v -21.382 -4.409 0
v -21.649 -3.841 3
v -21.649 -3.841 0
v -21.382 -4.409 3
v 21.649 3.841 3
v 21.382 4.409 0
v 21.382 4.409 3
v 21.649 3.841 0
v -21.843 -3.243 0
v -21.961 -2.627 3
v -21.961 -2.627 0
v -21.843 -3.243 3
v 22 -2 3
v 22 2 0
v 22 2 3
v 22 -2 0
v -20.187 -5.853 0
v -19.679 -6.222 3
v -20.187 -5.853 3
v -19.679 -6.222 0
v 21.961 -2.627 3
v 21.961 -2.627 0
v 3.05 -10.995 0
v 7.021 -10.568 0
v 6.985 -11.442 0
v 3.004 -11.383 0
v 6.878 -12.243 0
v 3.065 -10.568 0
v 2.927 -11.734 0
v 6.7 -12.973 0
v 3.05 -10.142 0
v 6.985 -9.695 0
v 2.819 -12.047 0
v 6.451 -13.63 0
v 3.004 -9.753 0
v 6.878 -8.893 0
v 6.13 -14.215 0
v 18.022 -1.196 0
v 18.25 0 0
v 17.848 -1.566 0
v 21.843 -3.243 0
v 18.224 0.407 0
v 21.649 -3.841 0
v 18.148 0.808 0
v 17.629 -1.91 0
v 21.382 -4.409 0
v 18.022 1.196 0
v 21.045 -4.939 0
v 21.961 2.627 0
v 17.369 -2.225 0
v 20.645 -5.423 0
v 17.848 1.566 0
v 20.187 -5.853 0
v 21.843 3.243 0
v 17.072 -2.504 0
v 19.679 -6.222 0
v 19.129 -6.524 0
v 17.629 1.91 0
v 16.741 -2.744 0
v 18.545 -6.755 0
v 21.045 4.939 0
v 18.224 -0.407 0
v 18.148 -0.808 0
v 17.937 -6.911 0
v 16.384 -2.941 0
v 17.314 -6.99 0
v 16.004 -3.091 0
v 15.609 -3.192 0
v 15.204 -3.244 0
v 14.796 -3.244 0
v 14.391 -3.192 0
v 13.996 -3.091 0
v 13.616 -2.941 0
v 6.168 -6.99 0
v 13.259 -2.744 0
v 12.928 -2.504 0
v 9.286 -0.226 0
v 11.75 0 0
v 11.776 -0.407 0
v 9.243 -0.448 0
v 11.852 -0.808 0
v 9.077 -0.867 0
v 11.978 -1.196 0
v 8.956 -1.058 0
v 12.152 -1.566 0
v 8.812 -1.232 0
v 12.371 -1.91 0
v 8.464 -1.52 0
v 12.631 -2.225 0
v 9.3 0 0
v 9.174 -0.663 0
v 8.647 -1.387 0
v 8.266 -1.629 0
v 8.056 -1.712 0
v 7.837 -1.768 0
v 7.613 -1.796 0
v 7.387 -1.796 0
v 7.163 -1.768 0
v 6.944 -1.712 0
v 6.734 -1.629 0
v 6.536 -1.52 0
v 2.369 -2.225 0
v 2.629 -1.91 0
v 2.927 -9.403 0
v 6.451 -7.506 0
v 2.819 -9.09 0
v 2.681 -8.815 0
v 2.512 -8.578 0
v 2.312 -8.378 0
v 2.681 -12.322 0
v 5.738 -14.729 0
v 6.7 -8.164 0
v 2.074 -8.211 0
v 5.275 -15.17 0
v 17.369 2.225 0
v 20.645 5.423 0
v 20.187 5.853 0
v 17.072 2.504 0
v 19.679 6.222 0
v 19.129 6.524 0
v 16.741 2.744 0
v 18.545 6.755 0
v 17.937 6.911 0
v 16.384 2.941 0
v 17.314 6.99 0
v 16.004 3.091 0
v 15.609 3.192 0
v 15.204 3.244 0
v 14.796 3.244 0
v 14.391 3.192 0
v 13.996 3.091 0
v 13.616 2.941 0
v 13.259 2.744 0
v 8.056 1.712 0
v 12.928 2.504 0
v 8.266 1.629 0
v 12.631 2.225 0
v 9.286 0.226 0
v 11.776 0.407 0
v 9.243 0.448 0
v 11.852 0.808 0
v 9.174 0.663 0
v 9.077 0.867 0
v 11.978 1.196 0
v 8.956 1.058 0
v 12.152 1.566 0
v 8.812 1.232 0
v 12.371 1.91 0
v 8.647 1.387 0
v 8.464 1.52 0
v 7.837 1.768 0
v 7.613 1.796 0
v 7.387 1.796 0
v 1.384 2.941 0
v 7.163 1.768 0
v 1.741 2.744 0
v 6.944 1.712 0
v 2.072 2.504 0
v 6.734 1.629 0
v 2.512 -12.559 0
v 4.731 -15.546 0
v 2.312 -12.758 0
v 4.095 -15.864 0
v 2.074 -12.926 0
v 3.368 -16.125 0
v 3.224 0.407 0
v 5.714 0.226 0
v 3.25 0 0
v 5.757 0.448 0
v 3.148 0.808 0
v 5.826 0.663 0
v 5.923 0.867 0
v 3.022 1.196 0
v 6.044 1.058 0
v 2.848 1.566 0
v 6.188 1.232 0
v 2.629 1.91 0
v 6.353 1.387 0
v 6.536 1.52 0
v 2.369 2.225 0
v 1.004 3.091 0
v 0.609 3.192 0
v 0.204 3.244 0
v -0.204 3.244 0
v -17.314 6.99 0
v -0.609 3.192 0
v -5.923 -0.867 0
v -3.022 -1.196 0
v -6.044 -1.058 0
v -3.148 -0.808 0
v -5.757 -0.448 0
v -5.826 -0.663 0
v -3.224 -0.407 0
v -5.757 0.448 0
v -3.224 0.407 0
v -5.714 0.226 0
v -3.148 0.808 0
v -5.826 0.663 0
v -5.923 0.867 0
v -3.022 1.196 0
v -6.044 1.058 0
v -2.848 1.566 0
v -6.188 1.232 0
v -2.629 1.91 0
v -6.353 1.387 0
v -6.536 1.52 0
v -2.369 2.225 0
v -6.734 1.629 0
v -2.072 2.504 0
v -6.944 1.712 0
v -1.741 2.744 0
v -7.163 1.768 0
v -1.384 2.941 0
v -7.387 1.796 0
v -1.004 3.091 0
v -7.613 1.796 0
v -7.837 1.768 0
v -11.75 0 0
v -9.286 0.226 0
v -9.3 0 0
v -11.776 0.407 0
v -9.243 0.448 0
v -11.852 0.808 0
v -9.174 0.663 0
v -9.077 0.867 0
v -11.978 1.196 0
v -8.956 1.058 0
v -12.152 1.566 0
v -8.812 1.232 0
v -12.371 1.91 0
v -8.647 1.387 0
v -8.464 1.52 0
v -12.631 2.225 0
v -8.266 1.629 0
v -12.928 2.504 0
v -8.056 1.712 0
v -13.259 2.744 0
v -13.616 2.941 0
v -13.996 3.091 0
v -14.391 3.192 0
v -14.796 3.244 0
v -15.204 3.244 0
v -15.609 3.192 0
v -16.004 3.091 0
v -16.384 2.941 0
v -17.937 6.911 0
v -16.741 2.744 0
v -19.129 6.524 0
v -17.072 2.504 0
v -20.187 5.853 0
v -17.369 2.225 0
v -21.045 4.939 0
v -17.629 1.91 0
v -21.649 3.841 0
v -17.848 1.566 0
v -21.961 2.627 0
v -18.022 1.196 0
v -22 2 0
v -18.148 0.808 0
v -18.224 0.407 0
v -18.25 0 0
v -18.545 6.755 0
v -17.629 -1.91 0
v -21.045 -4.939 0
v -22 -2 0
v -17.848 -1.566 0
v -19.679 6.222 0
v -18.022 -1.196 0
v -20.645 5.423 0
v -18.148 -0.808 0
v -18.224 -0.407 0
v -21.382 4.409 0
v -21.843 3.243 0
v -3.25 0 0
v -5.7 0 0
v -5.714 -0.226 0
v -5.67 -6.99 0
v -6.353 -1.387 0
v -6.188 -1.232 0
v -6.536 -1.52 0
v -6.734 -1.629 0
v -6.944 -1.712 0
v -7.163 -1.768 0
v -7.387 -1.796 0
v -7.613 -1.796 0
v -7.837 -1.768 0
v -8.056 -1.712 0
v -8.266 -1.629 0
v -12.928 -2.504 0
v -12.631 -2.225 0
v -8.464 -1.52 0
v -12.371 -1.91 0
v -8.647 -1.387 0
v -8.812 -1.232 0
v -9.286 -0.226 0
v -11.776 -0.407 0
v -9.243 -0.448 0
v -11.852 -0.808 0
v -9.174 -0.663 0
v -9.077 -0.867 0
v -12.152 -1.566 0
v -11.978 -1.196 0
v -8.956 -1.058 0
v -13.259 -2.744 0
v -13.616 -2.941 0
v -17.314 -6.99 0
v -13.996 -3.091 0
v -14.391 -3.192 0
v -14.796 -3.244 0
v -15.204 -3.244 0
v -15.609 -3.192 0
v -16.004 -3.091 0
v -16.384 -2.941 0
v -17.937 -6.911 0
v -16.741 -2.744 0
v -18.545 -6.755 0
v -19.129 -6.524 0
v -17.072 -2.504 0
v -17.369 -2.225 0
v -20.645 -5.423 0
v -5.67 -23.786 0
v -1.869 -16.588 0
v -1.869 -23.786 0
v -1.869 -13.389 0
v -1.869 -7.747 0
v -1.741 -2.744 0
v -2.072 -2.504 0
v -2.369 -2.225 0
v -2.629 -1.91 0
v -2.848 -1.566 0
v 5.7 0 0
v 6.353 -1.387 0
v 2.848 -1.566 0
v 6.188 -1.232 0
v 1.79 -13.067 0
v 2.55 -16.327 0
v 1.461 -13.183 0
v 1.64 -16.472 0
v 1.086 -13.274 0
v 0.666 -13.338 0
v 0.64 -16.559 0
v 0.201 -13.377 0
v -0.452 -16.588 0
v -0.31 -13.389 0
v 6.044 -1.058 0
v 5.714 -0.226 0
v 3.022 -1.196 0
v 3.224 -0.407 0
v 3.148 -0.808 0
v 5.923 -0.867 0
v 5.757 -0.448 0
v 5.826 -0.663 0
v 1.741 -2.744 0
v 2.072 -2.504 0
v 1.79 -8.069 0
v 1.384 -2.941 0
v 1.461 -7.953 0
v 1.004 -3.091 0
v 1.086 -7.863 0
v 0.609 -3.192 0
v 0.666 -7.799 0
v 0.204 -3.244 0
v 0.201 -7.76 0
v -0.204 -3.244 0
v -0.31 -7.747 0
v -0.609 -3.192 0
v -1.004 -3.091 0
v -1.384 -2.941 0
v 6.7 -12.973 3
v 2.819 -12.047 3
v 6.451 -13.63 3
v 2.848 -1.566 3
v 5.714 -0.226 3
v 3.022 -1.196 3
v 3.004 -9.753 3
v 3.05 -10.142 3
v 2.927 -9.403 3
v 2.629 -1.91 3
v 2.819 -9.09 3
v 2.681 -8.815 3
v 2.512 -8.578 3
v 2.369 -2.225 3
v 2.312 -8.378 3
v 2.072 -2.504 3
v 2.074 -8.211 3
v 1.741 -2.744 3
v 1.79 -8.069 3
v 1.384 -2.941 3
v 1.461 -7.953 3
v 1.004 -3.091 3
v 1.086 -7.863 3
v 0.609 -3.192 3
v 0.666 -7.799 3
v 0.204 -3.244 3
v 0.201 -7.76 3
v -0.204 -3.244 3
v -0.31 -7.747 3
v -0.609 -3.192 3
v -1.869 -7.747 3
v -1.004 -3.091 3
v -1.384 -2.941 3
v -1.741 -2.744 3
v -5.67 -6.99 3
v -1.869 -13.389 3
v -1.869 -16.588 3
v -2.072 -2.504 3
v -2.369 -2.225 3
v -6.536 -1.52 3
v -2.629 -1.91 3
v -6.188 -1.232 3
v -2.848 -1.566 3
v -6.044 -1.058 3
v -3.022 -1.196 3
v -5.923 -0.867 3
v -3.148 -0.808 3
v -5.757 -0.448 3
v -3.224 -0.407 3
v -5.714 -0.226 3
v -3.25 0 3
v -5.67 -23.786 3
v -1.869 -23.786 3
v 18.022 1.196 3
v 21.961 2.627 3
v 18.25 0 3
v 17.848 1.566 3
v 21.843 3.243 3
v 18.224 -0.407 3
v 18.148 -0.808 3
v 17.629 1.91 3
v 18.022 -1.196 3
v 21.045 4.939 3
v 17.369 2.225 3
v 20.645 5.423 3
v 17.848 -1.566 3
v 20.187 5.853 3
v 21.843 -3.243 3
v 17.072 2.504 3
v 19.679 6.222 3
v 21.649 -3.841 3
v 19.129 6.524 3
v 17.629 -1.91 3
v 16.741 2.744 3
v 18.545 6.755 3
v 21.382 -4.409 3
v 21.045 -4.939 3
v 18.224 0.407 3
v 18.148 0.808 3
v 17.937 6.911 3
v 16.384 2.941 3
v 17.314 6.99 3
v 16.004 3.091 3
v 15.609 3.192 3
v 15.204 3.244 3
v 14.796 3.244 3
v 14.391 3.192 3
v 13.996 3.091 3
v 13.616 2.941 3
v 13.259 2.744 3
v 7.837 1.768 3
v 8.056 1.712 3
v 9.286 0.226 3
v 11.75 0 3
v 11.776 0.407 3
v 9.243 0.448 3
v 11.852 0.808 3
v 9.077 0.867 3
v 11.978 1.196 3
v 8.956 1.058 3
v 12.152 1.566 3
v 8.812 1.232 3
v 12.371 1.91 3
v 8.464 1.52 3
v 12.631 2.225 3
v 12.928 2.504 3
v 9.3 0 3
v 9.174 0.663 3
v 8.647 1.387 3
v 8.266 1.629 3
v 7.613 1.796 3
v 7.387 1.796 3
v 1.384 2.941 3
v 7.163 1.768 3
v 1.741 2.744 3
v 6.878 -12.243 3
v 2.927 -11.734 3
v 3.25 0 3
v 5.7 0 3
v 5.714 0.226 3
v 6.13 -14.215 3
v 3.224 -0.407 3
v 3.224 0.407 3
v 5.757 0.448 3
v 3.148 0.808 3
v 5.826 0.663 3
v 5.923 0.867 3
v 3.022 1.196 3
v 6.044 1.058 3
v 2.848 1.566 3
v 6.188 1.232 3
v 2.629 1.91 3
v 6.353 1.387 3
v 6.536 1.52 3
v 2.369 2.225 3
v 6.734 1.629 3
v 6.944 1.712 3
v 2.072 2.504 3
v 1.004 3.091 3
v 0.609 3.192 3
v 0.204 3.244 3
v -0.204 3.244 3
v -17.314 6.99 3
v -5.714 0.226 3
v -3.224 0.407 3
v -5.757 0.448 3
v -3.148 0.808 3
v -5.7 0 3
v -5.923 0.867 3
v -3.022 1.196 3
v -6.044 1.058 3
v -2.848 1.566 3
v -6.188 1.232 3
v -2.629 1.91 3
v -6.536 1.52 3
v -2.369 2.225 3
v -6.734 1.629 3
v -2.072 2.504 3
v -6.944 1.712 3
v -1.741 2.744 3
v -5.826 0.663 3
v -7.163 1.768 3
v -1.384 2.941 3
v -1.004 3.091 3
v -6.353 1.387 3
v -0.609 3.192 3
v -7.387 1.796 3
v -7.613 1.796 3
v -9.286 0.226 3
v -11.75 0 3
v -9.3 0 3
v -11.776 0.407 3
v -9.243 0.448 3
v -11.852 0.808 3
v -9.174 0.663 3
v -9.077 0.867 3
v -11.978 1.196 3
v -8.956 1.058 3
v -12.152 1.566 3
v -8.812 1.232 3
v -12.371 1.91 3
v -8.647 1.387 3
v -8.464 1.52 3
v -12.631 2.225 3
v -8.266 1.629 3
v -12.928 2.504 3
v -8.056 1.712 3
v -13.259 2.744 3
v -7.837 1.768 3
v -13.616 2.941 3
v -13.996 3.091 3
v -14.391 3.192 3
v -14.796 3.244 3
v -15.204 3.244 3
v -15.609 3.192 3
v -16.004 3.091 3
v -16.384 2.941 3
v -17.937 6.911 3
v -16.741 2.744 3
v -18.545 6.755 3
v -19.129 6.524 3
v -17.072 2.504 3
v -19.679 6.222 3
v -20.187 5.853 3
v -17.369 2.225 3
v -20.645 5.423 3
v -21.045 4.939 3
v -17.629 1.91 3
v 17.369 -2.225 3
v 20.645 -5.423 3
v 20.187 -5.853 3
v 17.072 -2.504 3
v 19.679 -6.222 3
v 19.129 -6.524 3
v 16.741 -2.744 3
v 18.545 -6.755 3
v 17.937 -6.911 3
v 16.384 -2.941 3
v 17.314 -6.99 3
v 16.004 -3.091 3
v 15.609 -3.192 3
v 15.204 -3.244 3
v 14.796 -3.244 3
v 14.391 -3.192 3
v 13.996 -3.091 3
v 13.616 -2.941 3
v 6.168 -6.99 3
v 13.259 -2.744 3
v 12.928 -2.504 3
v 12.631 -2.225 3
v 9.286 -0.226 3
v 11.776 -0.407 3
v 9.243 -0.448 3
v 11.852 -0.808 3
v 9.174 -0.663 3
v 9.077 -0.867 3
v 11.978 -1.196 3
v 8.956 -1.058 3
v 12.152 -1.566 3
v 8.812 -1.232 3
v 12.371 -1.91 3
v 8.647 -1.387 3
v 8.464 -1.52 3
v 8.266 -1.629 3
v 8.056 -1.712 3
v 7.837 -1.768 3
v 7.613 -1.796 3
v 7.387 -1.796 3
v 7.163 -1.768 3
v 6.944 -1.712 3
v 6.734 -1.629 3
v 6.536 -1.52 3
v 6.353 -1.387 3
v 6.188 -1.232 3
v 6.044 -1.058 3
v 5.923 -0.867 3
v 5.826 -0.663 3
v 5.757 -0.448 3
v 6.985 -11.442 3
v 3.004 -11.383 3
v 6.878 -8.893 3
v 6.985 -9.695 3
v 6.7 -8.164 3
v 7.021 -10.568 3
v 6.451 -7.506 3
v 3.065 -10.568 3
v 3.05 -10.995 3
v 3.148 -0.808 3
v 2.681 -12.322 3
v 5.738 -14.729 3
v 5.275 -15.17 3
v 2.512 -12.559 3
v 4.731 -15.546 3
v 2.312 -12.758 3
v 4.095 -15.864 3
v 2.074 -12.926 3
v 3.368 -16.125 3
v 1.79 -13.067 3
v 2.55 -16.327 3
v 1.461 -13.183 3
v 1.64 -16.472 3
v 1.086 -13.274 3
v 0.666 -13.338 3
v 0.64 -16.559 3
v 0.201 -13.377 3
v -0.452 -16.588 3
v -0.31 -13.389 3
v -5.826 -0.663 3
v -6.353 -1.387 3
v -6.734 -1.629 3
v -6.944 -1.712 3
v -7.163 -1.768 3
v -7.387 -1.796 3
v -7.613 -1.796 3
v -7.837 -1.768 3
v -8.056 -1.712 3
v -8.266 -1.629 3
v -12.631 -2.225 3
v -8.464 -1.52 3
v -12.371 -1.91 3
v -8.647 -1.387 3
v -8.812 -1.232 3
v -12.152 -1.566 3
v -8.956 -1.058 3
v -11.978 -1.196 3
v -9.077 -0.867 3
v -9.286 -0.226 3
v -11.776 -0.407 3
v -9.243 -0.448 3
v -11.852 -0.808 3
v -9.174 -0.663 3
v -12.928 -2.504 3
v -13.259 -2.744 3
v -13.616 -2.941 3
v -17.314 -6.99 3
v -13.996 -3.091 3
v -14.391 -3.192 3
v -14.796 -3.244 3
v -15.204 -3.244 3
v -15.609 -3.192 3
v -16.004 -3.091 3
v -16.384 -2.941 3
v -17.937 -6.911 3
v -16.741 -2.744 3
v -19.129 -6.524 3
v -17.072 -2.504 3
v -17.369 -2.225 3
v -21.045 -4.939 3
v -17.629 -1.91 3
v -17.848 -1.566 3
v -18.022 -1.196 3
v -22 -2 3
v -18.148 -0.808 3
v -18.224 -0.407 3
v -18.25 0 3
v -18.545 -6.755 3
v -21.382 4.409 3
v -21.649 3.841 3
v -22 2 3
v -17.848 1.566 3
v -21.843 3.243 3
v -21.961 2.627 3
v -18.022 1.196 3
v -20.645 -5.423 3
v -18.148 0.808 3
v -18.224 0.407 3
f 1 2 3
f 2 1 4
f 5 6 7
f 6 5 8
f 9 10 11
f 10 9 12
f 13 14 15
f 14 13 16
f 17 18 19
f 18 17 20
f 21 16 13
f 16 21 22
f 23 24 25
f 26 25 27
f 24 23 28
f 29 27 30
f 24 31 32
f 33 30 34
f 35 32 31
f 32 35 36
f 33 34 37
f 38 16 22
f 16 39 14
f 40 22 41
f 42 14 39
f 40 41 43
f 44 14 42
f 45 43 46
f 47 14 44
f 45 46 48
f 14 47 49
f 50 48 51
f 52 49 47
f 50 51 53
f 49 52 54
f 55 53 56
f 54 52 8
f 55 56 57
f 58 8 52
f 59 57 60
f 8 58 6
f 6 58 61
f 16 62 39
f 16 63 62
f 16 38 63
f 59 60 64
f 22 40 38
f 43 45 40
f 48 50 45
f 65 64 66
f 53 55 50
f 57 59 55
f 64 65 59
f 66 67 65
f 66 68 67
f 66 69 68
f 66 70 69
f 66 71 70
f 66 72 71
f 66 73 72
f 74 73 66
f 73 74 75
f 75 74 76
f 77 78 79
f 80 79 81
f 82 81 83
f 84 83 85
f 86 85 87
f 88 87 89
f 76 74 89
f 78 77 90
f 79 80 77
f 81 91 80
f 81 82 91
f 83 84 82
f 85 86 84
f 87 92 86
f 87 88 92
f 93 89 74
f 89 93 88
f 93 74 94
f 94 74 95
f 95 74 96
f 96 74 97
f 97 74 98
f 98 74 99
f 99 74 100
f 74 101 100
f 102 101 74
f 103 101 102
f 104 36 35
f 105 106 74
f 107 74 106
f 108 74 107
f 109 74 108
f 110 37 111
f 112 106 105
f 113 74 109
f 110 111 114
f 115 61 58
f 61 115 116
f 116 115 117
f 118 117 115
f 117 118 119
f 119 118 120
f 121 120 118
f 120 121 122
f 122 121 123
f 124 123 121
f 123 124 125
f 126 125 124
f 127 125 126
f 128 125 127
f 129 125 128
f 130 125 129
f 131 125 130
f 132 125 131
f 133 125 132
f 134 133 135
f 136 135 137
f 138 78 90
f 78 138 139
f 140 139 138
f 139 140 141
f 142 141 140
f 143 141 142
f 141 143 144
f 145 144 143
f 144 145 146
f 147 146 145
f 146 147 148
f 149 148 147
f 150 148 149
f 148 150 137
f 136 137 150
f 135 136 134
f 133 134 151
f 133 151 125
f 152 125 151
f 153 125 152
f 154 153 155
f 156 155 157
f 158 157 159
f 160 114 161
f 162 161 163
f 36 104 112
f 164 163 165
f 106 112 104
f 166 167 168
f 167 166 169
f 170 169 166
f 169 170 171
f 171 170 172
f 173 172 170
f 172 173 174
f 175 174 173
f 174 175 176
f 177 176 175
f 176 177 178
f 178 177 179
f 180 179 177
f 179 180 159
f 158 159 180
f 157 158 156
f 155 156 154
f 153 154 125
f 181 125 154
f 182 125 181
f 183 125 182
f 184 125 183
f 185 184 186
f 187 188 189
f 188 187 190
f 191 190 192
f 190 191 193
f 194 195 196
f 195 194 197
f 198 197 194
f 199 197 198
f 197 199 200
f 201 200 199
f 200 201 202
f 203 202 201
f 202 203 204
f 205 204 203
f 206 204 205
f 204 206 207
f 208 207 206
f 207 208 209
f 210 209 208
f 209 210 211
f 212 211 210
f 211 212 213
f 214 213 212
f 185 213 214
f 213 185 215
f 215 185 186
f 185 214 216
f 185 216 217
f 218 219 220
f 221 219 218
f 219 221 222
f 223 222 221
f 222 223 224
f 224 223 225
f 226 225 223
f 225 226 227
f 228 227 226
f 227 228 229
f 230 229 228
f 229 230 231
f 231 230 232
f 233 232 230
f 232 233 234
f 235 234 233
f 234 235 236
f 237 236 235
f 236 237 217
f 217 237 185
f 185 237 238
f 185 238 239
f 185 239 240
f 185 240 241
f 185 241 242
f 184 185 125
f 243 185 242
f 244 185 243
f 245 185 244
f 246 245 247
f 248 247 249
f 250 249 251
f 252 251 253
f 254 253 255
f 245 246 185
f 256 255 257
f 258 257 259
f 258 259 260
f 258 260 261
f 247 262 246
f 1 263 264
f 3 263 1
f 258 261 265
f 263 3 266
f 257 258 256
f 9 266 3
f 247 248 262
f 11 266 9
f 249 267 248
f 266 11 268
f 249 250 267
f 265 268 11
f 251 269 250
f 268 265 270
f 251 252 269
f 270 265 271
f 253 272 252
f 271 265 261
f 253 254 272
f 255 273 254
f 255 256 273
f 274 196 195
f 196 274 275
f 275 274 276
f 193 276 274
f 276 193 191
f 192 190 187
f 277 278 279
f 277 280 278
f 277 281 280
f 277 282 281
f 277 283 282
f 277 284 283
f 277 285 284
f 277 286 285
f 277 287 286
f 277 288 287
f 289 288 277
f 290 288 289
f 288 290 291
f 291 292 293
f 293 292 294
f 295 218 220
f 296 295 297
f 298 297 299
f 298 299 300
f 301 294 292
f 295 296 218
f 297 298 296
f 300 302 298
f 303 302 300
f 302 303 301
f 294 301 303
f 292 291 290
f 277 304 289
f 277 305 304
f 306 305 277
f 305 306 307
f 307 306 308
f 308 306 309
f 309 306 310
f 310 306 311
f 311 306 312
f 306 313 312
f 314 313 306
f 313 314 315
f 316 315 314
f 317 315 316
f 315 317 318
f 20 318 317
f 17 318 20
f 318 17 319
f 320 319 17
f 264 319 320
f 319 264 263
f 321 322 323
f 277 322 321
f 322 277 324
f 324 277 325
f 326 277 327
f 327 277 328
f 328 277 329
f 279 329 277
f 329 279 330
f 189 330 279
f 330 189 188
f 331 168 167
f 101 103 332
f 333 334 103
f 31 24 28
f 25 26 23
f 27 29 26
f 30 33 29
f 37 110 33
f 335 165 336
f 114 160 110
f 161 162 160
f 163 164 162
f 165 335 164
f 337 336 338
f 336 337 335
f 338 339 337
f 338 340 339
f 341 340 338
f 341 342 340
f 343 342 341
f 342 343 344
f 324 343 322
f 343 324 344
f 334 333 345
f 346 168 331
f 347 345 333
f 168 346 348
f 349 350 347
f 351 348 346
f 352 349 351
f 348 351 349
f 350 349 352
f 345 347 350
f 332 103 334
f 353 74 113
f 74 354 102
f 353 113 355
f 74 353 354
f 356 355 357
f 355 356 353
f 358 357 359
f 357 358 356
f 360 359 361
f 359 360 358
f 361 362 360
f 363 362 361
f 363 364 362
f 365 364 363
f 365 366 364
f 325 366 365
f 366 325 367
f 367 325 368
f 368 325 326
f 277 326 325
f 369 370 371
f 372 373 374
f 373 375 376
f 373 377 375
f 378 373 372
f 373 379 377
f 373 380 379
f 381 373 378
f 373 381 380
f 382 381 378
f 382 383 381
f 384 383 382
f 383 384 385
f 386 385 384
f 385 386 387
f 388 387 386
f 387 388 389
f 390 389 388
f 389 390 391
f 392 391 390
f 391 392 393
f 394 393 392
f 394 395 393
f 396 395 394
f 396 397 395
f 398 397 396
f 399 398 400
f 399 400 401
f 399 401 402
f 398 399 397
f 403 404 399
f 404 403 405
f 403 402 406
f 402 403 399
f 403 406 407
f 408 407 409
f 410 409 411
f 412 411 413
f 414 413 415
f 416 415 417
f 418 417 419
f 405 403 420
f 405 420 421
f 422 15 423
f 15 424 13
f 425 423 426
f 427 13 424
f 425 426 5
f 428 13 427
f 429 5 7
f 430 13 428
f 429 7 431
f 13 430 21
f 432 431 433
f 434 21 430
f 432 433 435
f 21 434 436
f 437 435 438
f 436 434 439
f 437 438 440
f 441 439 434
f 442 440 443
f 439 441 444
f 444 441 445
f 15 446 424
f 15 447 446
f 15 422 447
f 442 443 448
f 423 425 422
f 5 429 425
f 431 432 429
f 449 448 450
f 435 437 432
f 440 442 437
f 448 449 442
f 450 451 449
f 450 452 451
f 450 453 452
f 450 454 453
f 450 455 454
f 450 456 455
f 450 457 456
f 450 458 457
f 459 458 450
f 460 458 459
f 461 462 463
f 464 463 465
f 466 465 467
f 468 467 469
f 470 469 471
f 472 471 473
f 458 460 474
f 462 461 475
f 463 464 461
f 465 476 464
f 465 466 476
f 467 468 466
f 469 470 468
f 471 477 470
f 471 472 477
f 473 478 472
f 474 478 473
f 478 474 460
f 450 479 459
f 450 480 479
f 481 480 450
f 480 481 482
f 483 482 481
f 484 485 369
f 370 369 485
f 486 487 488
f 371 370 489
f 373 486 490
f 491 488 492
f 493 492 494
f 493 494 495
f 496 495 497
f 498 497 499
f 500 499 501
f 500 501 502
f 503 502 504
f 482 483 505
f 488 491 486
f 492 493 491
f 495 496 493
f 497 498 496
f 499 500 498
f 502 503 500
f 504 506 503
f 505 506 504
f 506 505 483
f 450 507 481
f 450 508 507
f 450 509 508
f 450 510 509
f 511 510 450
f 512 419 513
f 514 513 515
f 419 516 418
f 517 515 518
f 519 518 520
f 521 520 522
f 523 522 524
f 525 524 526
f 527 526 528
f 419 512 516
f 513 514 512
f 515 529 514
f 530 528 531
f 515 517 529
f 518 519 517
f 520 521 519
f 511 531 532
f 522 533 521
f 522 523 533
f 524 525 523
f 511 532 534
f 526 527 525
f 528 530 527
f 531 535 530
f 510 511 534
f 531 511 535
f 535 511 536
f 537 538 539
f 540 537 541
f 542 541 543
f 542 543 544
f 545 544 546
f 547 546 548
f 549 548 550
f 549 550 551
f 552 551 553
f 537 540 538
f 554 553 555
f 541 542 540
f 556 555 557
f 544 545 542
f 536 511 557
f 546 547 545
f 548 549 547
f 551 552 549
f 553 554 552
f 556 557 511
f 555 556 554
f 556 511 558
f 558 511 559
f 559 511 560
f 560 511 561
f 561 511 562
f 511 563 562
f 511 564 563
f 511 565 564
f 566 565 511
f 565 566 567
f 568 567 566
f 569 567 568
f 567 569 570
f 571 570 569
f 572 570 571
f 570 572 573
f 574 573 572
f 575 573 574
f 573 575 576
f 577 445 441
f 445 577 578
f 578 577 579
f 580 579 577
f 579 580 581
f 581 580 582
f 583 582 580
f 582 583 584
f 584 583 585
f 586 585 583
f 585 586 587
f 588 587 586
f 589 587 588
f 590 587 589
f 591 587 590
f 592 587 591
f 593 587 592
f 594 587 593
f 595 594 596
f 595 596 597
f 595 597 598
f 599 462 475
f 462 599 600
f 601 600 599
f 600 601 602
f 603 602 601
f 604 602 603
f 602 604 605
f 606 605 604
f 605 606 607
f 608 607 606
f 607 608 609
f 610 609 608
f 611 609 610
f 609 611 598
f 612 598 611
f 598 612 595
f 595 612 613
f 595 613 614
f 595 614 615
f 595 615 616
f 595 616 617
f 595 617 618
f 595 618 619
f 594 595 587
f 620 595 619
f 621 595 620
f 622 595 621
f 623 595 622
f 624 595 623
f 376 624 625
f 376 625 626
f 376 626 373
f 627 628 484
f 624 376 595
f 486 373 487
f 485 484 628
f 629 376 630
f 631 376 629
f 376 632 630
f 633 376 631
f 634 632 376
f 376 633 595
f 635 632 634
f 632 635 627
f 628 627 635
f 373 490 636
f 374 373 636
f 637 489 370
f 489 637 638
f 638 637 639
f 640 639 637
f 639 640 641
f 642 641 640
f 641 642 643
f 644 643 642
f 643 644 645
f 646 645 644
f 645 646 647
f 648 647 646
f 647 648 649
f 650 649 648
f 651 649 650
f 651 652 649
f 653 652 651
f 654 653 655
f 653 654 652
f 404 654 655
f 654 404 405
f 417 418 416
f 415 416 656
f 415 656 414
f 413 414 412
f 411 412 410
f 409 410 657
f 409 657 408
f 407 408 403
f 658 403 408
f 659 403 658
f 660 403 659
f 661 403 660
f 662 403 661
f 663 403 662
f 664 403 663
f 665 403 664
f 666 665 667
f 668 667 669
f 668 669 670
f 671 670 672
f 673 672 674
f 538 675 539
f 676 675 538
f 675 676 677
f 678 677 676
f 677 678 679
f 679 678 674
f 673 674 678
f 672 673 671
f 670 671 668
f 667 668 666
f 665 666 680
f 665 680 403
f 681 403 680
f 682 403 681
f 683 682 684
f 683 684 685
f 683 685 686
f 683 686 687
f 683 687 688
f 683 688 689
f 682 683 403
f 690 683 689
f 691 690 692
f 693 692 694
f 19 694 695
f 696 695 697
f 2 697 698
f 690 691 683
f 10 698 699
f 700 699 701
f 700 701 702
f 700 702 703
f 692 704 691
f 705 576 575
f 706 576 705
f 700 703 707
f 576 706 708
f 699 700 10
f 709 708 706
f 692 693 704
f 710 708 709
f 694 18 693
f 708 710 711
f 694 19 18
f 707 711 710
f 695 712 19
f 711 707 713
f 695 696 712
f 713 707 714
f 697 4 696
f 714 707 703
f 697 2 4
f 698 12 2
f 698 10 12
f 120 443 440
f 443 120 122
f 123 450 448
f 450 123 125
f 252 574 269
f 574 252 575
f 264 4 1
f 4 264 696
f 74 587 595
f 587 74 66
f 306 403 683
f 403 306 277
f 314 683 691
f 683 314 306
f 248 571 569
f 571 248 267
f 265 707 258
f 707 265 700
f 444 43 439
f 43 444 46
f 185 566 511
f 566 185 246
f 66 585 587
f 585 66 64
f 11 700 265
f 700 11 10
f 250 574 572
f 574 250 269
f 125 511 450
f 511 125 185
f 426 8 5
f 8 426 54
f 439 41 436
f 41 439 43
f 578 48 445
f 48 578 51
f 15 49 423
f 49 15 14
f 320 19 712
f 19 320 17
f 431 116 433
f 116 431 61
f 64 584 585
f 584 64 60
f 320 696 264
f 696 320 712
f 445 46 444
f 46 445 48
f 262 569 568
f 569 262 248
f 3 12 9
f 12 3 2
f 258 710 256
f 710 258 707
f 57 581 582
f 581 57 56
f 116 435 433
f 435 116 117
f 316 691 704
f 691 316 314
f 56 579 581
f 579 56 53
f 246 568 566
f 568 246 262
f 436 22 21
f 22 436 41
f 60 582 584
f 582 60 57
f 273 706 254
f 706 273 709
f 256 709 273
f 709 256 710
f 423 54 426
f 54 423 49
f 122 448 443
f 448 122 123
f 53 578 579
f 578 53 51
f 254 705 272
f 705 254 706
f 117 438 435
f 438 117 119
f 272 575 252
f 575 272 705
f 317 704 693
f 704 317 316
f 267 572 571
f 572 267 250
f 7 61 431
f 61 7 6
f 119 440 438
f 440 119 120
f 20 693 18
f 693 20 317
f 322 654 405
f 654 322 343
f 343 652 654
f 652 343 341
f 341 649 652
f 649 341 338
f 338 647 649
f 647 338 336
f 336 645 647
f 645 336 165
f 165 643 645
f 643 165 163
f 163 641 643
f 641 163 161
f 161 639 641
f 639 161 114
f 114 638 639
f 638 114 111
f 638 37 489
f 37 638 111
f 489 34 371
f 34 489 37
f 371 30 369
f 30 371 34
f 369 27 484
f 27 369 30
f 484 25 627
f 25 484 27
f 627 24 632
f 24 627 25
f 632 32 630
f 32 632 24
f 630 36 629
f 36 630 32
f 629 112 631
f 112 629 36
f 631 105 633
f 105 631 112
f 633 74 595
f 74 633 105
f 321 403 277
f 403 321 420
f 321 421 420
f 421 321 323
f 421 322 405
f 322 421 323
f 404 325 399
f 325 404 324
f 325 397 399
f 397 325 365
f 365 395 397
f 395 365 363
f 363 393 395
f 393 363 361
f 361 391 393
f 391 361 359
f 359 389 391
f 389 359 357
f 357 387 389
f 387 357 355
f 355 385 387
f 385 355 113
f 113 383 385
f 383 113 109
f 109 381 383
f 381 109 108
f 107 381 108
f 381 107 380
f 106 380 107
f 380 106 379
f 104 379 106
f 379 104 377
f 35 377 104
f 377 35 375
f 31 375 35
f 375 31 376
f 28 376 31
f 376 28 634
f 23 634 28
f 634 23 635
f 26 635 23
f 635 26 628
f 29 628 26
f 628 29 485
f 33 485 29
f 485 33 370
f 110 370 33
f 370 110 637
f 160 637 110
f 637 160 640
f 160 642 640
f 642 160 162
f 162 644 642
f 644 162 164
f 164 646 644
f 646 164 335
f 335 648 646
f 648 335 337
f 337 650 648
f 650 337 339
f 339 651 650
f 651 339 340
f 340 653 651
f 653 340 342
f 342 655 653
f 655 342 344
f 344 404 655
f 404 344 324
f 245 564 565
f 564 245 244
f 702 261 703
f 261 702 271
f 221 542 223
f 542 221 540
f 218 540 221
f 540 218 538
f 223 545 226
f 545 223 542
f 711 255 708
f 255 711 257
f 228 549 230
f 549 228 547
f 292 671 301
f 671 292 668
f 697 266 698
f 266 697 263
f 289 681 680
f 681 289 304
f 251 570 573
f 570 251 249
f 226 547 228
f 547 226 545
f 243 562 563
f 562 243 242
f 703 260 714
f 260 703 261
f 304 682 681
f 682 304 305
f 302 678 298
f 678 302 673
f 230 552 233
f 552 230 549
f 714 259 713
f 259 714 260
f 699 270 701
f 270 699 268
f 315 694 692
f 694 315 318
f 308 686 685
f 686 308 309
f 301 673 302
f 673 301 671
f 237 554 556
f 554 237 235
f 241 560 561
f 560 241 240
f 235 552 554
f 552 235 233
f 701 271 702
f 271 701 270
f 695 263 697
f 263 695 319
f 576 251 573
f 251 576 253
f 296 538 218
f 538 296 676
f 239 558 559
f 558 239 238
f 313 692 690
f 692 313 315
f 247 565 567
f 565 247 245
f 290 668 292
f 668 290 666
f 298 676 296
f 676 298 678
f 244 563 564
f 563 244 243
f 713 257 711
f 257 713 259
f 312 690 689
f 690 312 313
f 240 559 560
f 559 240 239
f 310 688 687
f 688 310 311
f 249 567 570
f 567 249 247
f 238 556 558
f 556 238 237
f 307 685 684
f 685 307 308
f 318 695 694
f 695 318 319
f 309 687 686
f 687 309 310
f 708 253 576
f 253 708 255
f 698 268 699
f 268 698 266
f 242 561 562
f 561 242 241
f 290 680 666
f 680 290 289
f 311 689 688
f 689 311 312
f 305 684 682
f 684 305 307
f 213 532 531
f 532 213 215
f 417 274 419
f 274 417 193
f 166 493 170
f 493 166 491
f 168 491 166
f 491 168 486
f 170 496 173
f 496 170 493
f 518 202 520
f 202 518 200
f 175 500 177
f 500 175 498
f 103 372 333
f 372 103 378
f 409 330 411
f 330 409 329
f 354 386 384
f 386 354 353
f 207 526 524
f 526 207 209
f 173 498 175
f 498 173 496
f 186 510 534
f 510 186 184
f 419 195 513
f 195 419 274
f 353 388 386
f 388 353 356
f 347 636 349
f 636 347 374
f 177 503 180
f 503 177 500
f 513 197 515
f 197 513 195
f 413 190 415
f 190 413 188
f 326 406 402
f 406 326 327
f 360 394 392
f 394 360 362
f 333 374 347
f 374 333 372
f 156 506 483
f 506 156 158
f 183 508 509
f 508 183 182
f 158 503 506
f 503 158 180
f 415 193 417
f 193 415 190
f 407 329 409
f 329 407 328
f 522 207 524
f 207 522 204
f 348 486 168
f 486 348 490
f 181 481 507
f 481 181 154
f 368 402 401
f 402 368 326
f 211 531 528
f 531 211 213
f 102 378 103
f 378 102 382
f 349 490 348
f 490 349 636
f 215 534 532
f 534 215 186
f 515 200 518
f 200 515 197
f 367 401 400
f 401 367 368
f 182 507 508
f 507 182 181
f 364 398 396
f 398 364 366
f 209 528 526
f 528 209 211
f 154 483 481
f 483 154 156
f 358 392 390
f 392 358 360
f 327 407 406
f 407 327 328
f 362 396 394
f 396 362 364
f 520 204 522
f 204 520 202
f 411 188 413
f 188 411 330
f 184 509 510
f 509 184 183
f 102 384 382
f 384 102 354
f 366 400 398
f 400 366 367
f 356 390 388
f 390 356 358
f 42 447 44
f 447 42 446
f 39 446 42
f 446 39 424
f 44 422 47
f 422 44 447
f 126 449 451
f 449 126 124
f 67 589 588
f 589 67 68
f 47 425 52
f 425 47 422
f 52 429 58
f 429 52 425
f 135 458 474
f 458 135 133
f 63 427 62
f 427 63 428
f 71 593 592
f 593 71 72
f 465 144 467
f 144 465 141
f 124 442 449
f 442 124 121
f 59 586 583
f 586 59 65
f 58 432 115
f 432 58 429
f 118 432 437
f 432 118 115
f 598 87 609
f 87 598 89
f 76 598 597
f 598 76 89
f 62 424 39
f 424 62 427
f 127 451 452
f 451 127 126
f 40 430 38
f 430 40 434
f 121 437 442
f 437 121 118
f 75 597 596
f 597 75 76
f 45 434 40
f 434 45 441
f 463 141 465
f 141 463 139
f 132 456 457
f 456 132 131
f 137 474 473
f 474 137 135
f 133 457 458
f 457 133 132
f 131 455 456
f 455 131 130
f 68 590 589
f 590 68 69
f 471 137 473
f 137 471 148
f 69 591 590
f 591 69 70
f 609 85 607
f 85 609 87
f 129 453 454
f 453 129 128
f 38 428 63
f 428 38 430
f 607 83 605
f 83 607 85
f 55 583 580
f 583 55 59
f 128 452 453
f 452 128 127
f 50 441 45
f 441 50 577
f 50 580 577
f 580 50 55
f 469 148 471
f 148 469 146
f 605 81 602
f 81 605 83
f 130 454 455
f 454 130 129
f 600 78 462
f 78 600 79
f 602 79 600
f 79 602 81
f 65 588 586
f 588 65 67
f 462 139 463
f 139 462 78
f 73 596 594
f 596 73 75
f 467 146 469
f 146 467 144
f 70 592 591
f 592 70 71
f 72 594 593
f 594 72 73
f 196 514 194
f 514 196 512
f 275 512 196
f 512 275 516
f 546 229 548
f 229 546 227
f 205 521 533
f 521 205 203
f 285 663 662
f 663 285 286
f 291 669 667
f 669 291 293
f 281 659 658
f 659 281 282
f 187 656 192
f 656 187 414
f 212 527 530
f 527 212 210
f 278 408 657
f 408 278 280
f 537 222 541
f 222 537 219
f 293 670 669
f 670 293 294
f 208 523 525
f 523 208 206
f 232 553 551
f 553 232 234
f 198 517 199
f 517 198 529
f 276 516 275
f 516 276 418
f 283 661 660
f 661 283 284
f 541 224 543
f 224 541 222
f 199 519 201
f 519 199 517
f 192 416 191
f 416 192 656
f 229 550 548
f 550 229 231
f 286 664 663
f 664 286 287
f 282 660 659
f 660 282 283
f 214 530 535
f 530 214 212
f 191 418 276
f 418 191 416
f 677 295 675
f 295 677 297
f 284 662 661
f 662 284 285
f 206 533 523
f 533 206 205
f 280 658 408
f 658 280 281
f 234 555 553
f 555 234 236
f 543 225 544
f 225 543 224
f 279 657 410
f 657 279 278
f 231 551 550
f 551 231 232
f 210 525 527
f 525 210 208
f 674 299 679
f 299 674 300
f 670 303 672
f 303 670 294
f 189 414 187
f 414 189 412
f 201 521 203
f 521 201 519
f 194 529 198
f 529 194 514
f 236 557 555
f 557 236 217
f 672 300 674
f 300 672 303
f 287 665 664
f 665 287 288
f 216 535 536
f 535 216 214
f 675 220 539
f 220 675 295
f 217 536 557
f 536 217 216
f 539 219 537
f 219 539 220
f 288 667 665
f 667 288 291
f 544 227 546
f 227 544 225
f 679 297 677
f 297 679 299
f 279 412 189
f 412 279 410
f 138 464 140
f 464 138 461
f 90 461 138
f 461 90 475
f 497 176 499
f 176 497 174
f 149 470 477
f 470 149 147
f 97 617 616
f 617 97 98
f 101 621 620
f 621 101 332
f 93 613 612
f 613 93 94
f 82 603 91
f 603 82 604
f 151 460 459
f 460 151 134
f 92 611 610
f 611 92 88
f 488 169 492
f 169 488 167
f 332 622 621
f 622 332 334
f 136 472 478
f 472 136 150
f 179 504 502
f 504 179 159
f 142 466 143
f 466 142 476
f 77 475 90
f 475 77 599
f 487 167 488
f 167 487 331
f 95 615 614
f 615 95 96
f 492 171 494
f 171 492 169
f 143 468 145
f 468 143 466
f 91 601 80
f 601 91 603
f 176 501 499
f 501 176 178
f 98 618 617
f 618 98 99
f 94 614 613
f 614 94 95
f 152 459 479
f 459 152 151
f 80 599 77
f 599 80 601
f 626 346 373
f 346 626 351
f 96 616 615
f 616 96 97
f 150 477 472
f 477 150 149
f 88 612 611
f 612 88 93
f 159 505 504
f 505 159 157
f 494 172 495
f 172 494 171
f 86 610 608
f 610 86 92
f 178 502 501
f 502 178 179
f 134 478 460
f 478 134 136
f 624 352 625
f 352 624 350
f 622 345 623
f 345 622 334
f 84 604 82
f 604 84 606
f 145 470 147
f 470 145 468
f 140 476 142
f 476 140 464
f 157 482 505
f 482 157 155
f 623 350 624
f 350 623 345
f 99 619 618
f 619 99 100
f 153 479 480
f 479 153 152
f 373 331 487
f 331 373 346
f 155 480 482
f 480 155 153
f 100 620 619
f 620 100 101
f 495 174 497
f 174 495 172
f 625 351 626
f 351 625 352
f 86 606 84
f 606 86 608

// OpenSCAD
$fn = 50;


difference() {
	union() {
		hull() {
			translate(v = [-17.0000000000, 2.0000000000, 0]) {
				cylinder(h = 3, r = 5);
			}
			translate(v = [17.0000000000, 2.0000000000, 0]) {
				cylinder(h = 3, r = 5);
			}
			translate(v = [-17.0000000000, -2.0000000000, 0]) {
				cylinder(h = 3, r = 5);
			}
			translate(v = [17.0000000000, -2.0000000000, 0]) {
				cylinder(h = 3, r = 5);
			}
		}
		translate(v = [0, -5, 0]) {
			linear_extrude(height = 3) {
				text(font = "DejaVu Sans Mono:style=Bold", halign = "center", size = 19.0000000000, text = "P", valign = "top");
			}
		}
	}
	union() {
		translate(v = [-15.0000000000, 0.0000000000, 0]) {
			translate(v = [0, 0, -100]) {
				cylinder(h = 200, r = 3.2500000000);
			}
		}
		translate(v = [0, 0, -100]) {
			cylinder(h = 200, r = 3.2500000000);
		}
		translate(v = [15.0000000000, 0.0000000000, 0]) {
			translate(v = [0, 0, -100]) {
				cylinder(h = 200, r = 3.2500000000);
			}
		}
		translate(v = [-15.0000000000, 0.0000000000, 0]) {
			translate(v = [0, 0, -100]) {
				cylinder(h = 200, r = 1.8000000000);
			}
		}
		translate(v = [-7.5000000000, 0.0000000000, 0]) {
			translate(v = [0, 0, -100]) {
				cylinder(h = 200, r = 1.8000000000);
			}
		}
		translate(v = [0, 0, -100]) {
			cylinder(h = 200, r = 1.8000000000);
		}
		translate(v = [7.5000000000, 0.0000000000, 0]) {
			translate(v = [0, 0, -100]) {
				cylinder(h = 200, r = 1.8000000000);
			}
		}
		translate(v = [15.0000000000, 0.0000000000, 0]) {
			translate(v = [0, 0, -100]) {
				cylinder(h = 200, r = 1.8000000000);
			}
		}
	}
}
